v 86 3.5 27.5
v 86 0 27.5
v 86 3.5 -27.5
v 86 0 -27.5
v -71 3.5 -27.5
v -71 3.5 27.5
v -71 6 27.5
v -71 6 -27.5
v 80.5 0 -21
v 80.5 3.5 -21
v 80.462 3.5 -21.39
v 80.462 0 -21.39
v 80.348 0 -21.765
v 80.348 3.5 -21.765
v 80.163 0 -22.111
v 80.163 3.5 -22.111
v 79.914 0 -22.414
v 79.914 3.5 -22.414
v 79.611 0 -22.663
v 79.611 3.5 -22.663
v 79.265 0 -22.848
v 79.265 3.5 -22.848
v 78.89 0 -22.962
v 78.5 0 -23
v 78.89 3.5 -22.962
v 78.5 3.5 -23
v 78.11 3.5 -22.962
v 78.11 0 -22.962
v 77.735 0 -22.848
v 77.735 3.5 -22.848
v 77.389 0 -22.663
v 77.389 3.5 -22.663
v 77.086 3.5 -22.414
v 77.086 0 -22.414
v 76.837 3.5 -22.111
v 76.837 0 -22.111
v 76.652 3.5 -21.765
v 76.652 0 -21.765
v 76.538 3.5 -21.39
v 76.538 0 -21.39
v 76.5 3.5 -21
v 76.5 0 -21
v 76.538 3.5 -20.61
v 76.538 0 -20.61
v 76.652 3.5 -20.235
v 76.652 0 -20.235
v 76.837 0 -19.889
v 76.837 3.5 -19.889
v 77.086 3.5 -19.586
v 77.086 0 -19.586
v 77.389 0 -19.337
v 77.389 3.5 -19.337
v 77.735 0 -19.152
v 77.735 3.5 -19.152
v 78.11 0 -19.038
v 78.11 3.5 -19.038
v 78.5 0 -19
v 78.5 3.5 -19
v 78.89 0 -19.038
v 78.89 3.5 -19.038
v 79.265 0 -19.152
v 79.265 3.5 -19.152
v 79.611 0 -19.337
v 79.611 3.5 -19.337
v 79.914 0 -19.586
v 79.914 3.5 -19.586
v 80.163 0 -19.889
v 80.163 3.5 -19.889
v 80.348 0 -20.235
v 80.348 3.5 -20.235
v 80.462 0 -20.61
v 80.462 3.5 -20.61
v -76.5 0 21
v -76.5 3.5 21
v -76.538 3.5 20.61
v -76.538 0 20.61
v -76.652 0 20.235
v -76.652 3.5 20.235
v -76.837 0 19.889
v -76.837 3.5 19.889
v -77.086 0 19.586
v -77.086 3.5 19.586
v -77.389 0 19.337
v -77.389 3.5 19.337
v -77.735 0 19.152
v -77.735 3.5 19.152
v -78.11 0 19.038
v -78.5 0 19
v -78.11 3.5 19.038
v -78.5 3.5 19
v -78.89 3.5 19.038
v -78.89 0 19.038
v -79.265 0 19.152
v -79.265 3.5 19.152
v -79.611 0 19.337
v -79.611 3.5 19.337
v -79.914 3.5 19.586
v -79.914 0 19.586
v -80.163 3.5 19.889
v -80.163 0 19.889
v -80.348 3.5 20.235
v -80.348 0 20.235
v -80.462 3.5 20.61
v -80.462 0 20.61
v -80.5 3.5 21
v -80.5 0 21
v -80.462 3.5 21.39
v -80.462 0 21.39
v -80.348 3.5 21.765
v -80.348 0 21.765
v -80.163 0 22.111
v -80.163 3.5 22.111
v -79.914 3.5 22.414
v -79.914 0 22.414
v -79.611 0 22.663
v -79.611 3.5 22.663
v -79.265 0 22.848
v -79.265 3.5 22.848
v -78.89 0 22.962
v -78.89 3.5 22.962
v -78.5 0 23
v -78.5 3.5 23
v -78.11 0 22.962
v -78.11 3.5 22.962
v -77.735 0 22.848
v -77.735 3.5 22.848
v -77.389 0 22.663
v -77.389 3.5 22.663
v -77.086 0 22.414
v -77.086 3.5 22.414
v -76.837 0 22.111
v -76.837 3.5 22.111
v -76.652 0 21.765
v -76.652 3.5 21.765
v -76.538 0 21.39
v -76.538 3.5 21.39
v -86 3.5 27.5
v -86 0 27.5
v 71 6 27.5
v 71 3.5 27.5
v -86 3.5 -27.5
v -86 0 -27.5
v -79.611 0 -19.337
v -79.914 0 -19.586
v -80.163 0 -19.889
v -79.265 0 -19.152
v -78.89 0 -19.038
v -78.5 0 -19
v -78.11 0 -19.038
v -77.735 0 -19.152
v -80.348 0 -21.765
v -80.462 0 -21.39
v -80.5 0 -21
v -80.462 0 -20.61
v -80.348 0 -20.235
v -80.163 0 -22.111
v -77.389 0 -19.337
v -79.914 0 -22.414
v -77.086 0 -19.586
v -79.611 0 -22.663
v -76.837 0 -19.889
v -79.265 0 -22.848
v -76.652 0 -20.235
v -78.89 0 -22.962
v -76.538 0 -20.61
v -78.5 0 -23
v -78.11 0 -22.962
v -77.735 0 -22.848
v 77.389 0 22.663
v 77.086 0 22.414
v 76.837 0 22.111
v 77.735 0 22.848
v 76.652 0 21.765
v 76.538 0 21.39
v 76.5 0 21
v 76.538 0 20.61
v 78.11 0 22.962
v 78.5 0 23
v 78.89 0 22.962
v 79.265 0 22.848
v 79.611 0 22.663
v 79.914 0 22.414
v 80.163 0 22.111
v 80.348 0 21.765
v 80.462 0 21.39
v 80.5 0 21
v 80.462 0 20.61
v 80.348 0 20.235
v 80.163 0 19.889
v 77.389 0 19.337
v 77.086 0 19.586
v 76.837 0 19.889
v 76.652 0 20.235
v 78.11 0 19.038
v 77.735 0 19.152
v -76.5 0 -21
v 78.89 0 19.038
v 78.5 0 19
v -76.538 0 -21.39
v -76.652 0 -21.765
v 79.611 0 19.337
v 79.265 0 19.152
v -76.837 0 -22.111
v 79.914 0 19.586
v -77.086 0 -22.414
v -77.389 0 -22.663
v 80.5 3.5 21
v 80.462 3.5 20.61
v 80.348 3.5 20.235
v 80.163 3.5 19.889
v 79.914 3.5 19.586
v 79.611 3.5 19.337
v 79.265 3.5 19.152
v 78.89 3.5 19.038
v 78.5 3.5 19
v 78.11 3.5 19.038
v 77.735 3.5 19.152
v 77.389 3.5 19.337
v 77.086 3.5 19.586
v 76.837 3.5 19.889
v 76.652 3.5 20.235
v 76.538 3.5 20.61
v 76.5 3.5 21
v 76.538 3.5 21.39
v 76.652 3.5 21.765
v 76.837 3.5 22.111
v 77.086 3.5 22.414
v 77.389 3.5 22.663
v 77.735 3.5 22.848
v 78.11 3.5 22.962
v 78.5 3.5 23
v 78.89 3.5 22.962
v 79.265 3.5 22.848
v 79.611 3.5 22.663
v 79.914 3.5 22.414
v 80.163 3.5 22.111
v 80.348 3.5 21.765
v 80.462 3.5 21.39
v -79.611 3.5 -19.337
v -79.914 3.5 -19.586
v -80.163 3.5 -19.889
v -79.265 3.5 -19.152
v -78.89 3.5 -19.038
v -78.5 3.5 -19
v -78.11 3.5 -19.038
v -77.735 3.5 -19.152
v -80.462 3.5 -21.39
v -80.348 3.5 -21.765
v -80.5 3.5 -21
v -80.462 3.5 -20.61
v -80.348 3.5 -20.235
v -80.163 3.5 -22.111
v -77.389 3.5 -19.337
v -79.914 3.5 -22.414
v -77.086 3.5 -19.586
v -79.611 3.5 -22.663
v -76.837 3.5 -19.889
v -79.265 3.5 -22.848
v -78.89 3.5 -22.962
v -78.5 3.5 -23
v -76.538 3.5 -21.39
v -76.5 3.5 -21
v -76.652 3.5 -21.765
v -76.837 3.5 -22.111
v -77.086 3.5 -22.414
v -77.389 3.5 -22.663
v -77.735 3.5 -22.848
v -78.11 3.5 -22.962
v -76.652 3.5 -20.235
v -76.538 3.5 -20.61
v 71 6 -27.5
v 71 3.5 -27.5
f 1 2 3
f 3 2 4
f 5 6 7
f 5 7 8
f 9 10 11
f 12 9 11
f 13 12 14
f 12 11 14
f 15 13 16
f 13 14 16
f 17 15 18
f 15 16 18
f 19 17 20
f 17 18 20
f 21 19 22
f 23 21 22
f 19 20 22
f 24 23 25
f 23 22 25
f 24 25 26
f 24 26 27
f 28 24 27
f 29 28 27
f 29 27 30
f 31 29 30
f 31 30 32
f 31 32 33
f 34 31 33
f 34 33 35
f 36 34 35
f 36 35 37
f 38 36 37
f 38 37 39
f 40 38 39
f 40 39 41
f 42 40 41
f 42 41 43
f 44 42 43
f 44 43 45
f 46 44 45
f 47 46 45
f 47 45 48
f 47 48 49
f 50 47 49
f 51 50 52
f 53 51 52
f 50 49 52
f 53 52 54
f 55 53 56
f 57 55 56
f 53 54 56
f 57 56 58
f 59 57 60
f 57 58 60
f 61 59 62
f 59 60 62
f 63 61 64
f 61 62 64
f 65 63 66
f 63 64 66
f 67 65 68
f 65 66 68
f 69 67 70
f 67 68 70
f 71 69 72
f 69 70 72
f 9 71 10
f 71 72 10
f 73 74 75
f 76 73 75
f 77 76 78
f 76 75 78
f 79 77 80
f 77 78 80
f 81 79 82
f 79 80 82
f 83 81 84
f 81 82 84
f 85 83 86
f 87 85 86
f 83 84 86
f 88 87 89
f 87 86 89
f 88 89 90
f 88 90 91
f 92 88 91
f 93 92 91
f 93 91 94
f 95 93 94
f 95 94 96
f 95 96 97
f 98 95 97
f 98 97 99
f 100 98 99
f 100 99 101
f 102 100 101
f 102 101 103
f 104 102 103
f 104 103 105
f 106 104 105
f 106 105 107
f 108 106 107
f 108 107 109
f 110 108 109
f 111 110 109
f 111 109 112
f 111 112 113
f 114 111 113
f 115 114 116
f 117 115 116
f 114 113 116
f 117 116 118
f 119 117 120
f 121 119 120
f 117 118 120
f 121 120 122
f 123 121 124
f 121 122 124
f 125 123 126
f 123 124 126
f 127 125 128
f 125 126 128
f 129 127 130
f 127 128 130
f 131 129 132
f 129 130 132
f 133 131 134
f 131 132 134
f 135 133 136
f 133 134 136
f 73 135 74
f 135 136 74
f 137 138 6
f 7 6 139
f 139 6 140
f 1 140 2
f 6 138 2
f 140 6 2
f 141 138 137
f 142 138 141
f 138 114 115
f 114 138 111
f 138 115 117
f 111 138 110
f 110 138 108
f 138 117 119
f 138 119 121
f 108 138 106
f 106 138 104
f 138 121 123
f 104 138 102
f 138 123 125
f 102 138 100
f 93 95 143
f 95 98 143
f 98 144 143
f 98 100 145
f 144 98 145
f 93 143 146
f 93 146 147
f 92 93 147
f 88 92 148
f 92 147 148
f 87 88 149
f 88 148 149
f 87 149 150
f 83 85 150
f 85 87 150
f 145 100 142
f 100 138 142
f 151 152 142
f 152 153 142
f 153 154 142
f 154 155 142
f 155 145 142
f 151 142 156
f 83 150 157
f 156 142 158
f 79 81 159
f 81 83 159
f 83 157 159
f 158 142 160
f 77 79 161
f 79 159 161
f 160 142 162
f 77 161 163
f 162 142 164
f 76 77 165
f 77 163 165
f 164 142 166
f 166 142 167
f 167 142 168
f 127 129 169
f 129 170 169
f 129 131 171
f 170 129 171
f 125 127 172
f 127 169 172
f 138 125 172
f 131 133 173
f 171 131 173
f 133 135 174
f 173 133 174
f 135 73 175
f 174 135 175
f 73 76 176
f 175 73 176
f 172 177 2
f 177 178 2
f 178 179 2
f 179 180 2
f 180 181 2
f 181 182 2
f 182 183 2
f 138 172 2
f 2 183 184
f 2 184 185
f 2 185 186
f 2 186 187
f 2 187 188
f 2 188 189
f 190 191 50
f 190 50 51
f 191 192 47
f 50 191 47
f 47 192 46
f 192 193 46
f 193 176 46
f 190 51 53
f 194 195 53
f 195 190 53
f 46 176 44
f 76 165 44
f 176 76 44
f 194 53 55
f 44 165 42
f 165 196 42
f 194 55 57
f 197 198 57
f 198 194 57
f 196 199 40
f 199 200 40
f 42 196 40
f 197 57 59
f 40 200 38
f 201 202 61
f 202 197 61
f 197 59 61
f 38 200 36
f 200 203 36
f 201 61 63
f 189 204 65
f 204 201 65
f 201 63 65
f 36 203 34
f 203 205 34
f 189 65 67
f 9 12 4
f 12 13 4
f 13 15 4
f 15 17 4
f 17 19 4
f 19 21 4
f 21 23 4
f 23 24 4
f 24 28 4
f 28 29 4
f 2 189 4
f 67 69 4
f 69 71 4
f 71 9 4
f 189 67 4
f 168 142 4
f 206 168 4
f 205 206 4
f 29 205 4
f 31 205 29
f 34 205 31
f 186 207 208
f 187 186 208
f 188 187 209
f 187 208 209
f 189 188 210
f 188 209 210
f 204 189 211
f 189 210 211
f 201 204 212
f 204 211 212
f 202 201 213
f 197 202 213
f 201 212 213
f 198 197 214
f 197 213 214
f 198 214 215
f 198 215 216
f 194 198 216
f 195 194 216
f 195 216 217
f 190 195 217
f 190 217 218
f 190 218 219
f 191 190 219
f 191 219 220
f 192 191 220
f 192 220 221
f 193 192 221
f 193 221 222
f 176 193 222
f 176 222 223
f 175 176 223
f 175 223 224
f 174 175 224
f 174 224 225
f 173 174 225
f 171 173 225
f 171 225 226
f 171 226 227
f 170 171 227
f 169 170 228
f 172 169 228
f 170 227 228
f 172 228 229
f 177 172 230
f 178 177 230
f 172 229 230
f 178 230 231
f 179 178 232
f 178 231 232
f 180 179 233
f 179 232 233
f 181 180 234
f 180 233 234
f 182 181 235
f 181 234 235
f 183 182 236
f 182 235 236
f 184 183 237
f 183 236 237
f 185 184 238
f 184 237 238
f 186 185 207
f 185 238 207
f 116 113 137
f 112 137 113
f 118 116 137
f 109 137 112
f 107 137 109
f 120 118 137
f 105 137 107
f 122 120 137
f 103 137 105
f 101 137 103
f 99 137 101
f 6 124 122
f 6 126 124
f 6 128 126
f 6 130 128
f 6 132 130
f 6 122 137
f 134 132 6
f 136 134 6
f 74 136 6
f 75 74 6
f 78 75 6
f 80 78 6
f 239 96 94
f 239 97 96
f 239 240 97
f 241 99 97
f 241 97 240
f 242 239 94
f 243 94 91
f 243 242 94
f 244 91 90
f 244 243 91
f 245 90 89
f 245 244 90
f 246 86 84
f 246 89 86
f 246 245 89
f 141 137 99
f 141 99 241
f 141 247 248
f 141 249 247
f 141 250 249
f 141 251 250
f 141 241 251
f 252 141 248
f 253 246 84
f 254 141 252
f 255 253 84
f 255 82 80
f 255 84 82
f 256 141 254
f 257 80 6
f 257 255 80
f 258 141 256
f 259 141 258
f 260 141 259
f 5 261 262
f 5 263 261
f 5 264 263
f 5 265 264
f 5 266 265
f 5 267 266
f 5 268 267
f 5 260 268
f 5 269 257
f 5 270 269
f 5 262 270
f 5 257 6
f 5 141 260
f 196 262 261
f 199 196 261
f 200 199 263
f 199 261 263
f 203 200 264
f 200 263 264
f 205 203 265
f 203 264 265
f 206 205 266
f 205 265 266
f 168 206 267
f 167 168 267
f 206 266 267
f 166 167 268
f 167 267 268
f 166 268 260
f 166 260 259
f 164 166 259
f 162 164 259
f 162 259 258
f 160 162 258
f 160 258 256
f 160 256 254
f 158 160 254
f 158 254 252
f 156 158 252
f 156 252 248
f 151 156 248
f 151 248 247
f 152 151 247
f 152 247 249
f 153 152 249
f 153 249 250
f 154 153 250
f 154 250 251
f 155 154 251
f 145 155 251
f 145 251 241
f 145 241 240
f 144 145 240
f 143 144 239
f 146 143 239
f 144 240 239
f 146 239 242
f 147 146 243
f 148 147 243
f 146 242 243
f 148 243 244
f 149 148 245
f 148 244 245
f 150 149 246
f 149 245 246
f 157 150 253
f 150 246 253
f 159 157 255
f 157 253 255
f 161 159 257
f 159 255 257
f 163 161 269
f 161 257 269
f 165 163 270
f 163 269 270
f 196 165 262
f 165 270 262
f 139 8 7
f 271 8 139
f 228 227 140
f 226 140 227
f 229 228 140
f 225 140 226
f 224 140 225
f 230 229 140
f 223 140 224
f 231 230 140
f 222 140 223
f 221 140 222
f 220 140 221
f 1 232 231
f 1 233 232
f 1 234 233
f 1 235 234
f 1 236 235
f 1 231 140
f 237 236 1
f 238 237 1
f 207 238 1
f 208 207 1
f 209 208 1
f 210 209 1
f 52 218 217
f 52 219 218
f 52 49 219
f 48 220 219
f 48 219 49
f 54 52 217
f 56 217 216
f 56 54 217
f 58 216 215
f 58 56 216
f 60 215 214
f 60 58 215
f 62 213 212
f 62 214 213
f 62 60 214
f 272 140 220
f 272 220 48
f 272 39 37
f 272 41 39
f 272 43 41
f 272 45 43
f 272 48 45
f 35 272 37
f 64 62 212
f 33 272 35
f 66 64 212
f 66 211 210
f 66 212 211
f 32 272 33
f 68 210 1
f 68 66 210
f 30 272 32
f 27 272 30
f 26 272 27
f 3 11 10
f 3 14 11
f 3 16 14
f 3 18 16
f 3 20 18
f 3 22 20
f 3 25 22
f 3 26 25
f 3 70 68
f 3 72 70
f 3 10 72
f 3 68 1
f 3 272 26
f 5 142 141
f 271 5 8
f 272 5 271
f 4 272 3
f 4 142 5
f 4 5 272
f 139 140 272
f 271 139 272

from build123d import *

# Parameters (mm, degrees)
ESQUISSE1_W             = 172
ESQUISSE1_H             = 55
BOSS_EXTRU_1_DEPTH      = 3.5
ESQUISSE2_R             = 2
ENL_V_MAT_EXTRU_1_DEPTH = 6
ESQUISSE3_W             = 142
ESQUISSE3_H             = 55
BOSS_EXTRU_2_DEPTH      = 2.5


with BuildPart() as part:
    # Esquisse1 → Boss.-Extru.1 (new body)
    with BuildSketch(Plane(origin=(0, 0, 0), x_dir=(1, 0, 0), z_dir=(0, 1, 0))):
        Rectangle(ESQUISSE1_W, ESQUISSE1_H)
    extrude(amount=BOSS_EXTRU_1_DEPTH)

    # Esquisse2 → Enlèv. mat.-Extru.1 (cut)
    with BuildSketch(Plane(origin=(0, 3.5, 0), x_dir=(1, 0, 0), z_dir=(0, 1, 0))):
        with Locations((-78.5, 21)):
            Circle(ESQUISSE2_R)
        with Locations((-78.5, -21)):
            Circle(ESQUISSE2_R)
        with Locations((78.5, -21)):
            Circle(ESQUISSE2_R)
        with Locations((78.5, 21)):
            Circle(ESQUISSE2_R)
    extrude(amount=-ENL_V_MAT_EXTRU_1_DEPTH, mode=Mode.SUBTRACT)

    # Esquisse3 → Boss.-Extru.2 (add)
    with BuildSketch(Plane(origin=(0, 3.5, 0), x_dir=(1, 0, 0), z_dir=(0, 1, 0))):
        Rectangle(ESQUISSE3_W, ESQUISSE3_H)
    extrude(amount=BOSS_EXTRU_2_DEPTH)


solid = part.part
